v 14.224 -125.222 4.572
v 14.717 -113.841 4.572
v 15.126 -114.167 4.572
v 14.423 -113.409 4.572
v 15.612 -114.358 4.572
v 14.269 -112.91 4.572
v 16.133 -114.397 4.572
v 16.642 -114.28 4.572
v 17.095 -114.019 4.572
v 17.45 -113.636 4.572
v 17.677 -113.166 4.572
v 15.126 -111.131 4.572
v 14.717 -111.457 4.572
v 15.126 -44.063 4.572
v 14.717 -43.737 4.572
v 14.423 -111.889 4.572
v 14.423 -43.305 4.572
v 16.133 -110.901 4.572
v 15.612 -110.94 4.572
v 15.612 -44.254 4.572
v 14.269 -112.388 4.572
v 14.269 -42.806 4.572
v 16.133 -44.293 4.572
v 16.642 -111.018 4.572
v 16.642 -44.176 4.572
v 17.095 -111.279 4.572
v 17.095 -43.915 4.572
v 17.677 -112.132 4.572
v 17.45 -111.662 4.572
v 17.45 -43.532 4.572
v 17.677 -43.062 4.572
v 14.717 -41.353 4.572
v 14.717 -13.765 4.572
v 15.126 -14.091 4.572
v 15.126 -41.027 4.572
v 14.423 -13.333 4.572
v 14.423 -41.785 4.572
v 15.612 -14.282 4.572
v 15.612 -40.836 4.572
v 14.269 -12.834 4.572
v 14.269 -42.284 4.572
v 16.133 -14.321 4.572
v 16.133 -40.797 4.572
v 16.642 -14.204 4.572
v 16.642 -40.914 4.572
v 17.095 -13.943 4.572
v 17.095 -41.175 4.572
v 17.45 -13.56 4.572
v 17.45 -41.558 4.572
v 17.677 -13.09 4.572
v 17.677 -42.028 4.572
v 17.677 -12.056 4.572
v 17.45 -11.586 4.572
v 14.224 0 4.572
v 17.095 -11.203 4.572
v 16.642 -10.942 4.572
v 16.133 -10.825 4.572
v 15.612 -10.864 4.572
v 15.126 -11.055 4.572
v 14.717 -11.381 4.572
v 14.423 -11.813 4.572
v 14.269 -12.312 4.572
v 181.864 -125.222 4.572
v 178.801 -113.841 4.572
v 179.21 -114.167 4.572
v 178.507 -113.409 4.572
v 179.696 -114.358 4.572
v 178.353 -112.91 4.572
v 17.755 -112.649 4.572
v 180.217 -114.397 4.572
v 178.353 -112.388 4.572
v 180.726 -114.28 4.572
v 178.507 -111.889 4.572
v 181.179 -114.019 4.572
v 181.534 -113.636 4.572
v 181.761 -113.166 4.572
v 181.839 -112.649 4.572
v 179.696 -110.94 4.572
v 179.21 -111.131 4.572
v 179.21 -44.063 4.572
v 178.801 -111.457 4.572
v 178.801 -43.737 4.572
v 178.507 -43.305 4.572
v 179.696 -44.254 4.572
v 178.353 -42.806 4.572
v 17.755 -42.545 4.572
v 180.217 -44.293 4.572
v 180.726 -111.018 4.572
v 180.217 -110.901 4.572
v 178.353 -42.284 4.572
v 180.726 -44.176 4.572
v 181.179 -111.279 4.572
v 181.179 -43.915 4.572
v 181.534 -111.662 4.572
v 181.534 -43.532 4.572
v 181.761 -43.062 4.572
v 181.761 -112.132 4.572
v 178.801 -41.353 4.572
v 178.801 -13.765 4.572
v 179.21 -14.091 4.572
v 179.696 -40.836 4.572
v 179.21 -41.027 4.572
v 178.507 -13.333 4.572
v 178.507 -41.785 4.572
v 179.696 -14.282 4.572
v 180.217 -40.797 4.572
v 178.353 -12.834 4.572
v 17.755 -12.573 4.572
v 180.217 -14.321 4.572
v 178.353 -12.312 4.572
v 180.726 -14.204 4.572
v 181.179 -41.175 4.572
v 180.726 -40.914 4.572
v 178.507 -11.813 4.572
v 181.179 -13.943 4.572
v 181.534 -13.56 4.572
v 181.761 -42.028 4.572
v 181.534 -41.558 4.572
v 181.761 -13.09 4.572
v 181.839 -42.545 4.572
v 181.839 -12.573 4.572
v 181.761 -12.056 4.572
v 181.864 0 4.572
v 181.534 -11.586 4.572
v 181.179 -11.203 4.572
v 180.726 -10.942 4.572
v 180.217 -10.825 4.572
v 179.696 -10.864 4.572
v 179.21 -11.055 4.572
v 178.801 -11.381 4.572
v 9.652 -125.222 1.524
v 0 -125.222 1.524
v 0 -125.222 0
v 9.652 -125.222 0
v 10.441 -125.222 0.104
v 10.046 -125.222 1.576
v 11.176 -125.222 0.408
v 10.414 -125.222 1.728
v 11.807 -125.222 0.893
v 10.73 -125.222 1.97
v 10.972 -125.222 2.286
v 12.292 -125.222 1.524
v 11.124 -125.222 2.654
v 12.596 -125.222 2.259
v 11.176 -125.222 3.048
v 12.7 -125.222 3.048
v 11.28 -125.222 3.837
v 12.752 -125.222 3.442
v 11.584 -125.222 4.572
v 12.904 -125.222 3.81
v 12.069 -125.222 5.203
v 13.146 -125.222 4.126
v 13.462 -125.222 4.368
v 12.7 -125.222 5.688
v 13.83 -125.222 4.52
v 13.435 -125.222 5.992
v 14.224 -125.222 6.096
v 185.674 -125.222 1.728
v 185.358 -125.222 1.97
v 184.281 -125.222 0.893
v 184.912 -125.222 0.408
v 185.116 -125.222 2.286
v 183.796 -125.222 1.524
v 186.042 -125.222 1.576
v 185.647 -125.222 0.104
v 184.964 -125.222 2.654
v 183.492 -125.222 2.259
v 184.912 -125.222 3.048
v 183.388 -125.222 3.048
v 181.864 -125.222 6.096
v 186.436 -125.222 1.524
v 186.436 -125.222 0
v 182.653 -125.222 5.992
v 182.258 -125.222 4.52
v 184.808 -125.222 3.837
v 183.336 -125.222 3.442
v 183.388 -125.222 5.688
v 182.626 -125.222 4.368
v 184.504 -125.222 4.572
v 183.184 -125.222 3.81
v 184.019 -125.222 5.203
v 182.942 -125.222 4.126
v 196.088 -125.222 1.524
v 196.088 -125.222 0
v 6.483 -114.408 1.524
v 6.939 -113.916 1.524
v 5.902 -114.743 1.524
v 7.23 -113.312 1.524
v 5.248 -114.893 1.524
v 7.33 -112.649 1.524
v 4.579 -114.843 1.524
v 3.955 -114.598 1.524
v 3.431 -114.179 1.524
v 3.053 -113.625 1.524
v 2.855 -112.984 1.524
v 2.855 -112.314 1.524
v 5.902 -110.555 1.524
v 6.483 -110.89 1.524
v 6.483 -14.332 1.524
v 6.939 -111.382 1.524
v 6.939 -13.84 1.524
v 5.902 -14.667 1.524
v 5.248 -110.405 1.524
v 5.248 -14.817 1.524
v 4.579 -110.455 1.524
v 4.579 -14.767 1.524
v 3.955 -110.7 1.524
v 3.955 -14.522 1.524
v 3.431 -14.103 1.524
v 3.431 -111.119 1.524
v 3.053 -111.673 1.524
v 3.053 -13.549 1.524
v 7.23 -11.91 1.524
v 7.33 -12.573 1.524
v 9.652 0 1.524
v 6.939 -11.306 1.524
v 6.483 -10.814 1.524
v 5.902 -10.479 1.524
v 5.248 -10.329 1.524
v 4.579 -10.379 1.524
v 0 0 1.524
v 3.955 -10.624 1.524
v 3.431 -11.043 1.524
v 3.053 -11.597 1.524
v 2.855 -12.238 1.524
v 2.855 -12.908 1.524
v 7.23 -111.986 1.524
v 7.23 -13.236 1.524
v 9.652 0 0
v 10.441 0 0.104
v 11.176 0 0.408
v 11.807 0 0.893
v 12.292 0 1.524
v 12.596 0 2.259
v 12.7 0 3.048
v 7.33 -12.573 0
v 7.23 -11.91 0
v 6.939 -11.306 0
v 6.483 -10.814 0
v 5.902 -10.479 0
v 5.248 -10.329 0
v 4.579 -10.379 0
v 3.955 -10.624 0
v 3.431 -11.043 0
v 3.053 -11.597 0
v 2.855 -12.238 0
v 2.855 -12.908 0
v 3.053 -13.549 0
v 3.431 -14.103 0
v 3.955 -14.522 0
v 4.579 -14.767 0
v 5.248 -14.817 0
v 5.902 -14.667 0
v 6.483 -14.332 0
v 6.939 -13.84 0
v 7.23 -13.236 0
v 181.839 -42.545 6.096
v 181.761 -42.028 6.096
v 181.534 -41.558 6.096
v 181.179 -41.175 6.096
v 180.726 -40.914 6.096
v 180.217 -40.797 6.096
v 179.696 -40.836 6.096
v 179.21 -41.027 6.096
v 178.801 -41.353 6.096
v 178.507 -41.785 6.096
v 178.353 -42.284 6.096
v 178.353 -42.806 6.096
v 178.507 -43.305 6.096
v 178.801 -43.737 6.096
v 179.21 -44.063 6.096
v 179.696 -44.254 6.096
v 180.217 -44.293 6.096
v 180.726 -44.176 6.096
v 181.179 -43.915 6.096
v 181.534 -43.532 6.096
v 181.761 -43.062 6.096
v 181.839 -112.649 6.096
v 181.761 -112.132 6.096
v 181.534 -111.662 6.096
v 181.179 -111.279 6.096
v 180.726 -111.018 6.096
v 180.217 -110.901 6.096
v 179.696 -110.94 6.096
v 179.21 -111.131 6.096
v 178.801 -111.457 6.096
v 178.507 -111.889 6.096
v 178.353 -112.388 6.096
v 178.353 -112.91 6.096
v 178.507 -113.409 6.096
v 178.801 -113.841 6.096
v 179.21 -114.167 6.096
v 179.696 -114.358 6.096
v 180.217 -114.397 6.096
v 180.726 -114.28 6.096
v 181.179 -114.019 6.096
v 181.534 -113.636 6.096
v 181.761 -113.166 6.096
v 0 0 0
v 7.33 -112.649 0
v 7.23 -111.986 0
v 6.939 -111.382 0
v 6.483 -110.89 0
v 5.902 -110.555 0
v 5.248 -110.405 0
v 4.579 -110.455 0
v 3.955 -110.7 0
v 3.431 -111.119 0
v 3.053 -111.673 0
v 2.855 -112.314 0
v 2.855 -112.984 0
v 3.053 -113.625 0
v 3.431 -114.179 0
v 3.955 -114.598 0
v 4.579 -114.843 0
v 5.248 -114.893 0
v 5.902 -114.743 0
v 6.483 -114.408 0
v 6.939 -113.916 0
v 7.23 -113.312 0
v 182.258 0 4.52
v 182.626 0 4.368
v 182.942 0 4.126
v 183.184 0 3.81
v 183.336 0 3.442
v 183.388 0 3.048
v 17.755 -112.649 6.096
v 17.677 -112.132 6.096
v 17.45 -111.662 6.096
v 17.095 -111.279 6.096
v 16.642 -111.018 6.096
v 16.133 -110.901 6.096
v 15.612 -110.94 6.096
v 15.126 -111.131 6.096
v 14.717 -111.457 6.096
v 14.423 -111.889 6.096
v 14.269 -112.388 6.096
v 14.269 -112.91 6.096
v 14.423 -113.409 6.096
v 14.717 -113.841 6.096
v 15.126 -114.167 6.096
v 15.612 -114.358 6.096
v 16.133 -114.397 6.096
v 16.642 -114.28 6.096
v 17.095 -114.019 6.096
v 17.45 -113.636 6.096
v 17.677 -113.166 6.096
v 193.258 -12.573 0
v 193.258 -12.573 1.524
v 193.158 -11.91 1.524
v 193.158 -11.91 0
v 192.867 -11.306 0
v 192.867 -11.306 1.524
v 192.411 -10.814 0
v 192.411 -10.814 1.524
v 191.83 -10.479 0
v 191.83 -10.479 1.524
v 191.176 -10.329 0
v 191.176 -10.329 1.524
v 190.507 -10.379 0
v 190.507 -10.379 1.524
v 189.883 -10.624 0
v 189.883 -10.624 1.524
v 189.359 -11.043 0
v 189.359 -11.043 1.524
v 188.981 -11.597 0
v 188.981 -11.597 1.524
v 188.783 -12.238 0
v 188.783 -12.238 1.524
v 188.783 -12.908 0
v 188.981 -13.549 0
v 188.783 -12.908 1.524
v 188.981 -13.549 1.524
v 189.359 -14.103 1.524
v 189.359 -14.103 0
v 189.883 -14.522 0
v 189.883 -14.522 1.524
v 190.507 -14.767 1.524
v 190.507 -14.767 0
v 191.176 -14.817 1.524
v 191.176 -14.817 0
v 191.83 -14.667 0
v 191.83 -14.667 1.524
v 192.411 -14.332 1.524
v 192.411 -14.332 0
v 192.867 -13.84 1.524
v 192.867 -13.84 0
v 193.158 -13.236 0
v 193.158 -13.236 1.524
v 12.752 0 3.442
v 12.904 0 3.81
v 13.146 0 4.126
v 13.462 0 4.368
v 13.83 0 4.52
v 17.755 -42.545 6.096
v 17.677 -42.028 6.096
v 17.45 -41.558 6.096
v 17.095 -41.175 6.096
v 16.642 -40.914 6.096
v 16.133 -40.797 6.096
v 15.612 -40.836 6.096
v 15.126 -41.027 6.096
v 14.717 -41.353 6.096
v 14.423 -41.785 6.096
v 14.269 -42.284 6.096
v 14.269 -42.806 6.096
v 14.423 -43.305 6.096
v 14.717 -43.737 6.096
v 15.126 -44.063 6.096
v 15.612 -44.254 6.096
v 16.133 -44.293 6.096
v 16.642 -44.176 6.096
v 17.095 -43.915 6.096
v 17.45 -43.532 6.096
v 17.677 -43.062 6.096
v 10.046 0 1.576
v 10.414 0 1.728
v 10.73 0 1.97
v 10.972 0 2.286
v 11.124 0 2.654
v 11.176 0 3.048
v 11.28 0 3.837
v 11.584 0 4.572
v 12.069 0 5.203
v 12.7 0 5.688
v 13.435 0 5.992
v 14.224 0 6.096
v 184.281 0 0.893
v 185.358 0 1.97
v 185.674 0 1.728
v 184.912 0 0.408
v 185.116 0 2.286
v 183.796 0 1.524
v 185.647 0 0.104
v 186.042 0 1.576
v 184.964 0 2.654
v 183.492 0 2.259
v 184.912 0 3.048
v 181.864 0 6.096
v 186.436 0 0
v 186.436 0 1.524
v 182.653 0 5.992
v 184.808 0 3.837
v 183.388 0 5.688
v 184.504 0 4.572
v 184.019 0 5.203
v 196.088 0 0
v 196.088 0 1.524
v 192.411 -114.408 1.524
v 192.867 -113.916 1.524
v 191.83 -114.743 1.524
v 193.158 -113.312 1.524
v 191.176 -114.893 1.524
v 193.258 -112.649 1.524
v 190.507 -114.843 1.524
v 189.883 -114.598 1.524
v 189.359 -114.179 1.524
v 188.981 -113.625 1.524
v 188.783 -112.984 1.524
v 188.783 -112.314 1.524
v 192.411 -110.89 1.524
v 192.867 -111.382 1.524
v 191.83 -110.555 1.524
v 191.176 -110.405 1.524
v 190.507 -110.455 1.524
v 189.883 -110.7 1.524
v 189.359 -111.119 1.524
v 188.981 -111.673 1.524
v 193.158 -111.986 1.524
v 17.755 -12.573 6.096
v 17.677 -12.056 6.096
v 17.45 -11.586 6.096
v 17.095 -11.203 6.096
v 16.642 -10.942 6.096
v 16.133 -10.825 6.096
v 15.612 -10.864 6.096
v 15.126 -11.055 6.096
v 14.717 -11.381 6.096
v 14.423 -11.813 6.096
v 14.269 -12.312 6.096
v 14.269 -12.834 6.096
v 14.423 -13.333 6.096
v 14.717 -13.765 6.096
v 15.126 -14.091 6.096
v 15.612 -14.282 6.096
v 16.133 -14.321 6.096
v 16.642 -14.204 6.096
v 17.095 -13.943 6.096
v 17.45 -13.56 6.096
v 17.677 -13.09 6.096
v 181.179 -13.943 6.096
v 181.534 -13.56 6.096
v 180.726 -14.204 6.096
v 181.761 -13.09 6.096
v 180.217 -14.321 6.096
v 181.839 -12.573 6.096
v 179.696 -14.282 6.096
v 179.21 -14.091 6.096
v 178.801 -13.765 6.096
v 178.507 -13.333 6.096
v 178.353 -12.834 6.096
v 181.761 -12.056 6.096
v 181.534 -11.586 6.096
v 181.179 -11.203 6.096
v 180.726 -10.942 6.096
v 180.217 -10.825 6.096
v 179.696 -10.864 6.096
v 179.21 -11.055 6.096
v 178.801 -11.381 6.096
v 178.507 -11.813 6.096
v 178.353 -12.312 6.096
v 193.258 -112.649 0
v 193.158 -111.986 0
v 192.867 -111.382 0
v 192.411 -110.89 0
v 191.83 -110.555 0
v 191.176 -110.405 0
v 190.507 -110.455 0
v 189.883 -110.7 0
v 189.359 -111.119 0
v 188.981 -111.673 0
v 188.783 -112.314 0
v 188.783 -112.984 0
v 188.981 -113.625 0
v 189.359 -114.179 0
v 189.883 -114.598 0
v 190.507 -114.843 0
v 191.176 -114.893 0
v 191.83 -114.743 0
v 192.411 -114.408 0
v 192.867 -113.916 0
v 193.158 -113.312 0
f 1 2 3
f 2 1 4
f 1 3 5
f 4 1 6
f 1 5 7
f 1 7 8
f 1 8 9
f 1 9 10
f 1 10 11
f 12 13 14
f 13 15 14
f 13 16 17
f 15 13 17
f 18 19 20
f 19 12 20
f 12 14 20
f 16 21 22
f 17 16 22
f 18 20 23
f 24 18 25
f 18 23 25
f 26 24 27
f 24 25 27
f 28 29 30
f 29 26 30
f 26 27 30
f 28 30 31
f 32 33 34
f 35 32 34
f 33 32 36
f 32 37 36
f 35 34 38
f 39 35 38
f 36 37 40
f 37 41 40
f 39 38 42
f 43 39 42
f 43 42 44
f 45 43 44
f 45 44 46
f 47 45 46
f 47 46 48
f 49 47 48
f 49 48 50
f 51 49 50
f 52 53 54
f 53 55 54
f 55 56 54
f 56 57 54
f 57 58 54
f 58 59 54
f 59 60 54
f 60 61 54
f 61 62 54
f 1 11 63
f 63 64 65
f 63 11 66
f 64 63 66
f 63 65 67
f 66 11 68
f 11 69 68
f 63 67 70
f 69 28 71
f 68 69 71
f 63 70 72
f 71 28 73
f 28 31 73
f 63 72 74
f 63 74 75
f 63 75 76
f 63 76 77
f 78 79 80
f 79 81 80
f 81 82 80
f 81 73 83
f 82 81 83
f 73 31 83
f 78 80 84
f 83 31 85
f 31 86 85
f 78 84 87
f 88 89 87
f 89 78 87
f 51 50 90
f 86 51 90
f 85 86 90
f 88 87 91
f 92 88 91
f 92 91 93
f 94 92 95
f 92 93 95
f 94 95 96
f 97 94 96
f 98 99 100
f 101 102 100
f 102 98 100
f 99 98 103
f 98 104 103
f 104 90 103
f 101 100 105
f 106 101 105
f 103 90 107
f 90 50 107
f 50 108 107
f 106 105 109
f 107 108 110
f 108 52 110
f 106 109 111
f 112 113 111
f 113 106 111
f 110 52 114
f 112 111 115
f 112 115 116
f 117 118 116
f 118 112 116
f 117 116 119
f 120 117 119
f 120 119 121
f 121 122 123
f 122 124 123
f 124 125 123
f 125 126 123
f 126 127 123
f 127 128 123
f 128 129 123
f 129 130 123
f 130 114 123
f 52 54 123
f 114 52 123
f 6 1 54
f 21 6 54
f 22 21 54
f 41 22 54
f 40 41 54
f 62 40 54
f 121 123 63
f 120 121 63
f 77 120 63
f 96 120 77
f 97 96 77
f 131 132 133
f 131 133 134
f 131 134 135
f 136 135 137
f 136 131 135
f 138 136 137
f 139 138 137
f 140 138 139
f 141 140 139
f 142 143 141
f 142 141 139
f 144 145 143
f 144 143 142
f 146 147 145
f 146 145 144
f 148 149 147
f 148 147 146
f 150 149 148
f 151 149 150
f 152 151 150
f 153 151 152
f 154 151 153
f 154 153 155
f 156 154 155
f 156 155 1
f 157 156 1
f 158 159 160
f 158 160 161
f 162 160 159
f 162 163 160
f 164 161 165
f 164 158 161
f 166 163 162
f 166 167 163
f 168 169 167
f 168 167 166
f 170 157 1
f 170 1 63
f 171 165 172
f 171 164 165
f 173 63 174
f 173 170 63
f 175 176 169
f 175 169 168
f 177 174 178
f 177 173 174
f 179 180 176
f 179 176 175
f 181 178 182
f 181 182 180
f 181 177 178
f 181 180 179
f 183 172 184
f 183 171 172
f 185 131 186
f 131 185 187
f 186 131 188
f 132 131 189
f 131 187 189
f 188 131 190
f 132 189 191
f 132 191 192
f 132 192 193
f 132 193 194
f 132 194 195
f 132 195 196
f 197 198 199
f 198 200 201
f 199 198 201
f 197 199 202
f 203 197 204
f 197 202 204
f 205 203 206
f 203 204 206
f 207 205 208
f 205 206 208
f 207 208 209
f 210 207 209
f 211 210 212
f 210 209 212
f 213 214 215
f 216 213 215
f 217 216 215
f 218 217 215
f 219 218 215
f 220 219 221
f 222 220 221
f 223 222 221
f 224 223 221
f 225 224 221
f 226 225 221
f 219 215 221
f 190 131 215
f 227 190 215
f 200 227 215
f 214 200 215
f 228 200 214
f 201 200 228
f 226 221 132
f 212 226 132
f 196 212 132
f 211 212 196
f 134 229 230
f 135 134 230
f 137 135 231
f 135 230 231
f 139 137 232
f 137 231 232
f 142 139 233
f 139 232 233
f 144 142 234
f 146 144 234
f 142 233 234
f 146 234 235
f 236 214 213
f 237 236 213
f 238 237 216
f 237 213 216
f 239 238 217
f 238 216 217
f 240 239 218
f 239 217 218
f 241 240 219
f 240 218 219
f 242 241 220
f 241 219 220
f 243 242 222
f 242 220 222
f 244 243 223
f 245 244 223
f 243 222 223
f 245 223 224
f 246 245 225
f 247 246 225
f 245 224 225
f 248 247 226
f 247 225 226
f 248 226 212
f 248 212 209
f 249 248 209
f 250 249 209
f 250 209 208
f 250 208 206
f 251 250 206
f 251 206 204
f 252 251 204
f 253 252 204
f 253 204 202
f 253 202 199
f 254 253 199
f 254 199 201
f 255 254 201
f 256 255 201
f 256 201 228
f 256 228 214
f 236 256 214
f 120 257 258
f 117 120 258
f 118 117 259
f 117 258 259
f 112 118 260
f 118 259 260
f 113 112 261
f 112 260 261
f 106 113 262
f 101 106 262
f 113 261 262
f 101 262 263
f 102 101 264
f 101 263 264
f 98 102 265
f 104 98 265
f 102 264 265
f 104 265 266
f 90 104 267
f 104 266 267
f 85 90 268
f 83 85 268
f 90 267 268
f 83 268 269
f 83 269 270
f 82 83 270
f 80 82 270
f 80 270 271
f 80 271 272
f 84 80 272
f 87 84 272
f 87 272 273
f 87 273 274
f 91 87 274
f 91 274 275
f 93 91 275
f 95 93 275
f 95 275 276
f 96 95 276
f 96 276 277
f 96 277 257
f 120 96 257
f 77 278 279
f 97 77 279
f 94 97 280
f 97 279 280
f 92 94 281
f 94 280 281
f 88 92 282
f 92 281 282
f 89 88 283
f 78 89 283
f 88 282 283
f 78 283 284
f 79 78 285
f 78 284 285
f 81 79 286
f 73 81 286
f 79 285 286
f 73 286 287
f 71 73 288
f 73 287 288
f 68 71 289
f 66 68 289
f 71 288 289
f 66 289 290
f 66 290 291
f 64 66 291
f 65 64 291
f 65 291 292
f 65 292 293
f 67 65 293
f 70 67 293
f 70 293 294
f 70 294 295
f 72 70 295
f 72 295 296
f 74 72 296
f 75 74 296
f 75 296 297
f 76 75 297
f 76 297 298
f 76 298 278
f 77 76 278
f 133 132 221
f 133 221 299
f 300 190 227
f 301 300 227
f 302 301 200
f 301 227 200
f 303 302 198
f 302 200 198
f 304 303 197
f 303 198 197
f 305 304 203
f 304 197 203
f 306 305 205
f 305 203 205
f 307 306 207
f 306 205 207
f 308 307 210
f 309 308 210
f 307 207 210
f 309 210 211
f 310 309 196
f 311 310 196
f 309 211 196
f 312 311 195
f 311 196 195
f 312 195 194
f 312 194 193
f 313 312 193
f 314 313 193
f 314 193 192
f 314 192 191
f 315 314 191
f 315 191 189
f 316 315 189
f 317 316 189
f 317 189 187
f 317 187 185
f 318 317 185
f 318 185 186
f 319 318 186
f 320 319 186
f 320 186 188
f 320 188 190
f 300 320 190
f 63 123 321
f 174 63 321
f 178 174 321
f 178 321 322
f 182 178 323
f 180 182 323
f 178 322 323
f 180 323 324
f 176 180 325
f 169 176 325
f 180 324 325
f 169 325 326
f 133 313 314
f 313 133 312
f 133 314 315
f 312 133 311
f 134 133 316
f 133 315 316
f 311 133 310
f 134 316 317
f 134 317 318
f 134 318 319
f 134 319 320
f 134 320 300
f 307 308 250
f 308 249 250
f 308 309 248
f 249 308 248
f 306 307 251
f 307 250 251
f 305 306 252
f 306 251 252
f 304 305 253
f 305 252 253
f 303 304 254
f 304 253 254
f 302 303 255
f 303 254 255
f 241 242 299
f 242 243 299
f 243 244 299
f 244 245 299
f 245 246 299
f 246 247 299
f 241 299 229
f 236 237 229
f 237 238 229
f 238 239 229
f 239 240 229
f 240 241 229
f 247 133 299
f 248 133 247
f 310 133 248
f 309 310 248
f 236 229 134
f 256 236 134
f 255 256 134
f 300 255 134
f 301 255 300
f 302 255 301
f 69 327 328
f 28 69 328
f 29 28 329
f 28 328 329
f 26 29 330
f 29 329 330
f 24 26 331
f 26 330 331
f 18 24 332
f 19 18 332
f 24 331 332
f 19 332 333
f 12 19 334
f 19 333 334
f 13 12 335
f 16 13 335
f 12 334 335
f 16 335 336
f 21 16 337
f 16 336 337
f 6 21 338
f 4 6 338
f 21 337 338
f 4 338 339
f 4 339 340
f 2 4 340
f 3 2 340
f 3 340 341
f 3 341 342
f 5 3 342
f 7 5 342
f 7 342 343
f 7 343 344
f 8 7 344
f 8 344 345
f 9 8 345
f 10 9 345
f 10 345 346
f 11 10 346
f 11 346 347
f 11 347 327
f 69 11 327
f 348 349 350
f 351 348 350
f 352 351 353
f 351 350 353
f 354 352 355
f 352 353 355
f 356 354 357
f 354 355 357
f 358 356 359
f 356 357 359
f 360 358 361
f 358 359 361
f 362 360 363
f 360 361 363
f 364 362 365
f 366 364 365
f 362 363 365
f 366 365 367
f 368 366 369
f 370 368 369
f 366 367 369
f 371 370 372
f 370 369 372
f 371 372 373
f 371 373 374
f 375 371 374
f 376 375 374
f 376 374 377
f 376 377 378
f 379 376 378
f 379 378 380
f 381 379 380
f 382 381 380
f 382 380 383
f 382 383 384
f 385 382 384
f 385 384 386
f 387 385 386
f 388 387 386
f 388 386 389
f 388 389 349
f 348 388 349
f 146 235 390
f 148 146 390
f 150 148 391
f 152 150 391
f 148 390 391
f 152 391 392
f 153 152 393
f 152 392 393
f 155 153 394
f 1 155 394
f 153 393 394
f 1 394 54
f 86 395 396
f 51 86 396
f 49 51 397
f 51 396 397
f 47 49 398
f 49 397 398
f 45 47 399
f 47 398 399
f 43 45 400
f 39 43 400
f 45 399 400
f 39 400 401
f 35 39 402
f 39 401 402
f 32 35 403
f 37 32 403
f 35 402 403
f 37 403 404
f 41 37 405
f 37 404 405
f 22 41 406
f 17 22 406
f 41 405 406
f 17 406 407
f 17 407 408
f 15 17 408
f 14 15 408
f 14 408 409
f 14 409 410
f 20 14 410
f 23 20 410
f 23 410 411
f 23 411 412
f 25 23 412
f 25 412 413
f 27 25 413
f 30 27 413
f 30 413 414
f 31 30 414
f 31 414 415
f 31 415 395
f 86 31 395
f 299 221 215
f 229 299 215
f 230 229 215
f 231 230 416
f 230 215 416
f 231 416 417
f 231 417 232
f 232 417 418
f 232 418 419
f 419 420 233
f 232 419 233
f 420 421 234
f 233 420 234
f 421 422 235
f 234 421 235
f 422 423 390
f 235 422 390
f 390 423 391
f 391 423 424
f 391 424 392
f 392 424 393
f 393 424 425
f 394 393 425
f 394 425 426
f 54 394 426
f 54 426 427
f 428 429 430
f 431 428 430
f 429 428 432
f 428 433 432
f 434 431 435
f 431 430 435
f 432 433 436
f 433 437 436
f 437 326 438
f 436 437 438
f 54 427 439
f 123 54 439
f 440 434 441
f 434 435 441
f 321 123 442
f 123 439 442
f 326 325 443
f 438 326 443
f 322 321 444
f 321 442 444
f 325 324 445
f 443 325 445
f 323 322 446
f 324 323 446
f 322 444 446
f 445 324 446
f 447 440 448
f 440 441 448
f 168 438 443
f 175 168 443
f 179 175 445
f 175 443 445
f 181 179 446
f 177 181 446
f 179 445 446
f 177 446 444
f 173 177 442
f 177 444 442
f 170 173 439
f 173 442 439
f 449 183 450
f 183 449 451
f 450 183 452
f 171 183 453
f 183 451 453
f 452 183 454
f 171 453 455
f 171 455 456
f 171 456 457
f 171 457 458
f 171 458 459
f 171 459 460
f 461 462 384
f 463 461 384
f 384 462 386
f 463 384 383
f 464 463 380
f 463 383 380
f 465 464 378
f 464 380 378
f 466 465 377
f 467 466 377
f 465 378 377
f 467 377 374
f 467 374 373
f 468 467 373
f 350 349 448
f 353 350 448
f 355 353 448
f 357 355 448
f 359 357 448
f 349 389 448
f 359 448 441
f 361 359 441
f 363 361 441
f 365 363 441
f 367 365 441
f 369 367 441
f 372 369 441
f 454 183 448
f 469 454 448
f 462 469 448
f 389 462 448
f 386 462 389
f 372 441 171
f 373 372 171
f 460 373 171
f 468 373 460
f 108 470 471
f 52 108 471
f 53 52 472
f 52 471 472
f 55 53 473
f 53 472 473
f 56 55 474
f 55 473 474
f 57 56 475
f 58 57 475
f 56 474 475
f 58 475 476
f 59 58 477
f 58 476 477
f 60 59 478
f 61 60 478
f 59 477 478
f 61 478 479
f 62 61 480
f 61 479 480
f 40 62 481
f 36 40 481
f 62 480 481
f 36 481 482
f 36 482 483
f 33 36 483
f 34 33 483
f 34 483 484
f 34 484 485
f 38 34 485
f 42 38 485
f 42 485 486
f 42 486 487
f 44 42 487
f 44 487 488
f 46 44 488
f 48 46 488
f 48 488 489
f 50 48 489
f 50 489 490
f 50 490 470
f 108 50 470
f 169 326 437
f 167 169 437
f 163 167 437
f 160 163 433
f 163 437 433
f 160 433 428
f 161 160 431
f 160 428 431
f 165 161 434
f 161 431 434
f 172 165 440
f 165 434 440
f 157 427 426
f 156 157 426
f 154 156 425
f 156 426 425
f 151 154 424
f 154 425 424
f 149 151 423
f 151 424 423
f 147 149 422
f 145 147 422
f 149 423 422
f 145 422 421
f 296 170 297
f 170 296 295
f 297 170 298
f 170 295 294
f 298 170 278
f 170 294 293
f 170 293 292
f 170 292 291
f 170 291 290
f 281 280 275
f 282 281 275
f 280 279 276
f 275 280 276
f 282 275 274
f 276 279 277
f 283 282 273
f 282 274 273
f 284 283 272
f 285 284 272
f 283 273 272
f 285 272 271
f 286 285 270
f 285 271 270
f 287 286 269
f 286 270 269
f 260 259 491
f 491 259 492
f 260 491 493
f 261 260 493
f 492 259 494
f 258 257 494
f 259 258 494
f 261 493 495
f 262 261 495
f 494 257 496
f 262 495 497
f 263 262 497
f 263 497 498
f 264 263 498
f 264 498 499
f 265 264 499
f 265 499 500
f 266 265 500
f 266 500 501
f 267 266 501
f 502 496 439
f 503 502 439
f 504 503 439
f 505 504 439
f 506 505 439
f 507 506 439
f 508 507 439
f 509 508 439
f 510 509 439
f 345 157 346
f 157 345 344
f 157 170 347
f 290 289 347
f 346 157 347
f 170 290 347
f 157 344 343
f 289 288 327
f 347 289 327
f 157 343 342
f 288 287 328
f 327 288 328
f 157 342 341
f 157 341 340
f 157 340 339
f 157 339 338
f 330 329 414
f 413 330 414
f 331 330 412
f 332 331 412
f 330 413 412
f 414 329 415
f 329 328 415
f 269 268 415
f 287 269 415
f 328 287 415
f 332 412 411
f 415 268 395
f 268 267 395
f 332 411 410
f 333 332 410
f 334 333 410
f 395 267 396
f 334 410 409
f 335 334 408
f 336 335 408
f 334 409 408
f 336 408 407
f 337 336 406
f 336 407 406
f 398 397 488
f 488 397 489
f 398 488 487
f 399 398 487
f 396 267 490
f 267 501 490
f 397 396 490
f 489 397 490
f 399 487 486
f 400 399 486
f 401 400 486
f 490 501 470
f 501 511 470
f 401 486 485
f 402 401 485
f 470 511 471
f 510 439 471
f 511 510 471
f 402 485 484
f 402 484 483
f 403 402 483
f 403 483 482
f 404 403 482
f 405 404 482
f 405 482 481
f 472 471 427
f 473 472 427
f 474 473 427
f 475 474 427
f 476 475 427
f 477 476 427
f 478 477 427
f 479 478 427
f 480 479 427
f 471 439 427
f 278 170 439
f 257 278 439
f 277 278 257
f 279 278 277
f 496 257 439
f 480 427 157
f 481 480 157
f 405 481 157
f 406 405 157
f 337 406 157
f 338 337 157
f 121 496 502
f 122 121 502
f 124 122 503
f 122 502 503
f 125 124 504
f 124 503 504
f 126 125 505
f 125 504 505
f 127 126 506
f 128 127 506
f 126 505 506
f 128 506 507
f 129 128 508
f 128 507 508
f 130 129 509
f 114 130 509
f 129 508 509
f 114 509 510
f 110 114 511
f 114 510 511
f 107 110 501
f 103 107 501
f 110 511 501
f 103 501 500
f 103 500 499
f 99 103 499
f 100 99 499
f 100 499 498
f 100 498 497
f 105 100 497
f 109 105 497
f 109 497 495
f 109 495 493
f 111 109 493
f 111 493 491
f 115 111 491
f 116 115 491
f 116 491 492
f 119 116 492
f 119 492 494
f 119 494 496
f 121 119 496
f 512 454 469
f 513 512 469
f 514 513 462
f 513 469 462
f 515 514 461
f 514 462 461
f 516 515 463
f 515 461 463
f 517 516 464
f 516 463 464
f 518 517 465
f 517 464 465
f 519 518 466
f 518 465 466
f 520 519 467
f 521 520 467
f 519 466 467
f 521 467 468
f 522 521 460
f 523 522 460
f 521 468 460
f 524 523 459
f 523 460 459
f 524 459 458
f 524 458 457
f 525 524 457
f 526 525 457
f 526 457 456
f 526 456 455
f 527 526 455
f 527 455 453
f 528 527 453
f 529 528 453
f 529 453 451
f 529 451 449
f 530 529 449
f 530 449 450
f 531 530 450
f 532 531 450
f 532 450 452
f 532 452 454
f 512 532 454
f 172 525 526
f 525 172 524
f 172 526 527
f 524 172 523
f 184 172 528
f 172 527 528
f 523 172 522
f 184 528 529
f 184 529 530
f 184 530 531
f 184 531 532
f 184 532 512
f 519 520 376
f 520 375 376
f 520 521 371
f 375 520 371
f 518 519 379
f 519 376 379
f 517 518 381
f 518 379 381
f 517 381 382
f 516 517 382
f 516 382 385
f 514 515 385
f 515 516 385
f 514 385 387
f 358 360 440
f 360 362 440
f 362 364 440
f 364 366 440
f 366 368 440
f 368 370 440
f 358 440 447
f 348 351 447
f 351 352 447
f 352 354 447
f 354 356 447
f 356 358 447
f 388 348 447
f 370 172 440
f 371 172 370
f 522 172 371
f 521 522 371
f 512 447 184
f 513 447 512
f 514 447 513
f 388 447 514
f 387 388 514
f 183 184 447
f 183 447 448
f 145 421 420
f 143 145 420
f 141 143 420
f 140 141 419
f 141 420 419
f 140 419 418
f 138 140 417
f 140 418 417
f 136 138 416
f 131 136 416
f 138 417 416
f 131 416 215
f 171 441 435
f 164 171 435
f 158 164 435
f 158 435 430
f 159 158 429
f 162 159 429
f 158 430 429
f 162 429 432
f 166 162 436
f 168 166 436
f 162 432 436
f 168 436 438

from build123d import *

# Parameters (mm, degrees)
F1_DEPTH = 125.222
F2_R     = 2.25
F3_DEPTH = 1.525
F4_R     = 1.7526
F5_DEPTH = 25.4


with BuildPart() as f1:
    # F0 (on Front) → F1 (new body)
    with BuildSketch(Plane.XZ):
        with BuildLine():
            Line((0, 1.524), (0, 0))
            Line((0, 0), (9.652, 0))
            ThreePointArc((9.652, 0), (11.807261, 0.892739), (12.7, 3.048))
            ThreePointArc((12.7, 3.048), (13.146369, 4.125631), (14.224, 4.572))
            Line((14.224, 4.572), (181.864, 4.572))
            ThreePointArc((181.864, 4.572), (182.941631, 4.125631), (183.388, 3.048))
            ThreePointArc((183.388, 3.048), (184.280739, 0.892739), (186.436, 0))
            Line((186.436, 0), (196.088, 0))
            Line((196.088, 0), (196.088, 1.524))
            Line((196.088, 1.524), (186.436, 1.524))
            ThreePointArc((186.436, 1.524), (185.358369, 1.970369), (184.912, 3.048))
            ThreePointArc((184.912, 3.048), (184.019261, 5.203261), (181.864, 6.096))
            Line((181.864, 6.096), (14.224, 6.096))
            ThreePointArc((14.224, 6.096), (12.068739, 5.203261), (11.176, 3.048))
            ThreePointArc((11.176, 3.048), (10.729631, 1.970369), (9.652, 1.524))
            Line((9.652, 1.524), (0, 1.524))
        make_face()
    extrude(amount=F1_DEPTH)

    # F2 (on face) → F3 (cut, through all)
    with BuildSketch(Plane.XY.offset(1.524)):
        with Locations((5.08, -112.649)):
            Circle(F2_R)
        with Locations((191.008, -112.649)):
            Circle(F2_R)
        with Locations((191.008, -12.573)):
            Circle(F2_R)
        with Locations((5.08, -12.573)):
            Circle(F2_R)
    extrude(amount=-F3_DEPTH, mode=Mode.SUBTRACT)

    # F4 (on face) → F5 (cut)
    with BuildSketch(Plane.XY.offset(6.096)):
        with Locations((16.002, -12.573)):
            Circle(F4_R)
        with Locations((16.002, -42.545)):
            Circle(F4_R)
        with Locations((16.002, -112.649)):
            Circle(F4_R)
        with Locations((180.086, -112.649)):
            Circle(F4_R)
        with Locations((180.086, -42.545)):
            Circle(F4_R)
        with Locations((180.086, -12.573)):
            Circle(F4_R)
    extrude(amount=-F5_DEPTH, mode=Mode.SUBTRACT)


solid = f1.part
